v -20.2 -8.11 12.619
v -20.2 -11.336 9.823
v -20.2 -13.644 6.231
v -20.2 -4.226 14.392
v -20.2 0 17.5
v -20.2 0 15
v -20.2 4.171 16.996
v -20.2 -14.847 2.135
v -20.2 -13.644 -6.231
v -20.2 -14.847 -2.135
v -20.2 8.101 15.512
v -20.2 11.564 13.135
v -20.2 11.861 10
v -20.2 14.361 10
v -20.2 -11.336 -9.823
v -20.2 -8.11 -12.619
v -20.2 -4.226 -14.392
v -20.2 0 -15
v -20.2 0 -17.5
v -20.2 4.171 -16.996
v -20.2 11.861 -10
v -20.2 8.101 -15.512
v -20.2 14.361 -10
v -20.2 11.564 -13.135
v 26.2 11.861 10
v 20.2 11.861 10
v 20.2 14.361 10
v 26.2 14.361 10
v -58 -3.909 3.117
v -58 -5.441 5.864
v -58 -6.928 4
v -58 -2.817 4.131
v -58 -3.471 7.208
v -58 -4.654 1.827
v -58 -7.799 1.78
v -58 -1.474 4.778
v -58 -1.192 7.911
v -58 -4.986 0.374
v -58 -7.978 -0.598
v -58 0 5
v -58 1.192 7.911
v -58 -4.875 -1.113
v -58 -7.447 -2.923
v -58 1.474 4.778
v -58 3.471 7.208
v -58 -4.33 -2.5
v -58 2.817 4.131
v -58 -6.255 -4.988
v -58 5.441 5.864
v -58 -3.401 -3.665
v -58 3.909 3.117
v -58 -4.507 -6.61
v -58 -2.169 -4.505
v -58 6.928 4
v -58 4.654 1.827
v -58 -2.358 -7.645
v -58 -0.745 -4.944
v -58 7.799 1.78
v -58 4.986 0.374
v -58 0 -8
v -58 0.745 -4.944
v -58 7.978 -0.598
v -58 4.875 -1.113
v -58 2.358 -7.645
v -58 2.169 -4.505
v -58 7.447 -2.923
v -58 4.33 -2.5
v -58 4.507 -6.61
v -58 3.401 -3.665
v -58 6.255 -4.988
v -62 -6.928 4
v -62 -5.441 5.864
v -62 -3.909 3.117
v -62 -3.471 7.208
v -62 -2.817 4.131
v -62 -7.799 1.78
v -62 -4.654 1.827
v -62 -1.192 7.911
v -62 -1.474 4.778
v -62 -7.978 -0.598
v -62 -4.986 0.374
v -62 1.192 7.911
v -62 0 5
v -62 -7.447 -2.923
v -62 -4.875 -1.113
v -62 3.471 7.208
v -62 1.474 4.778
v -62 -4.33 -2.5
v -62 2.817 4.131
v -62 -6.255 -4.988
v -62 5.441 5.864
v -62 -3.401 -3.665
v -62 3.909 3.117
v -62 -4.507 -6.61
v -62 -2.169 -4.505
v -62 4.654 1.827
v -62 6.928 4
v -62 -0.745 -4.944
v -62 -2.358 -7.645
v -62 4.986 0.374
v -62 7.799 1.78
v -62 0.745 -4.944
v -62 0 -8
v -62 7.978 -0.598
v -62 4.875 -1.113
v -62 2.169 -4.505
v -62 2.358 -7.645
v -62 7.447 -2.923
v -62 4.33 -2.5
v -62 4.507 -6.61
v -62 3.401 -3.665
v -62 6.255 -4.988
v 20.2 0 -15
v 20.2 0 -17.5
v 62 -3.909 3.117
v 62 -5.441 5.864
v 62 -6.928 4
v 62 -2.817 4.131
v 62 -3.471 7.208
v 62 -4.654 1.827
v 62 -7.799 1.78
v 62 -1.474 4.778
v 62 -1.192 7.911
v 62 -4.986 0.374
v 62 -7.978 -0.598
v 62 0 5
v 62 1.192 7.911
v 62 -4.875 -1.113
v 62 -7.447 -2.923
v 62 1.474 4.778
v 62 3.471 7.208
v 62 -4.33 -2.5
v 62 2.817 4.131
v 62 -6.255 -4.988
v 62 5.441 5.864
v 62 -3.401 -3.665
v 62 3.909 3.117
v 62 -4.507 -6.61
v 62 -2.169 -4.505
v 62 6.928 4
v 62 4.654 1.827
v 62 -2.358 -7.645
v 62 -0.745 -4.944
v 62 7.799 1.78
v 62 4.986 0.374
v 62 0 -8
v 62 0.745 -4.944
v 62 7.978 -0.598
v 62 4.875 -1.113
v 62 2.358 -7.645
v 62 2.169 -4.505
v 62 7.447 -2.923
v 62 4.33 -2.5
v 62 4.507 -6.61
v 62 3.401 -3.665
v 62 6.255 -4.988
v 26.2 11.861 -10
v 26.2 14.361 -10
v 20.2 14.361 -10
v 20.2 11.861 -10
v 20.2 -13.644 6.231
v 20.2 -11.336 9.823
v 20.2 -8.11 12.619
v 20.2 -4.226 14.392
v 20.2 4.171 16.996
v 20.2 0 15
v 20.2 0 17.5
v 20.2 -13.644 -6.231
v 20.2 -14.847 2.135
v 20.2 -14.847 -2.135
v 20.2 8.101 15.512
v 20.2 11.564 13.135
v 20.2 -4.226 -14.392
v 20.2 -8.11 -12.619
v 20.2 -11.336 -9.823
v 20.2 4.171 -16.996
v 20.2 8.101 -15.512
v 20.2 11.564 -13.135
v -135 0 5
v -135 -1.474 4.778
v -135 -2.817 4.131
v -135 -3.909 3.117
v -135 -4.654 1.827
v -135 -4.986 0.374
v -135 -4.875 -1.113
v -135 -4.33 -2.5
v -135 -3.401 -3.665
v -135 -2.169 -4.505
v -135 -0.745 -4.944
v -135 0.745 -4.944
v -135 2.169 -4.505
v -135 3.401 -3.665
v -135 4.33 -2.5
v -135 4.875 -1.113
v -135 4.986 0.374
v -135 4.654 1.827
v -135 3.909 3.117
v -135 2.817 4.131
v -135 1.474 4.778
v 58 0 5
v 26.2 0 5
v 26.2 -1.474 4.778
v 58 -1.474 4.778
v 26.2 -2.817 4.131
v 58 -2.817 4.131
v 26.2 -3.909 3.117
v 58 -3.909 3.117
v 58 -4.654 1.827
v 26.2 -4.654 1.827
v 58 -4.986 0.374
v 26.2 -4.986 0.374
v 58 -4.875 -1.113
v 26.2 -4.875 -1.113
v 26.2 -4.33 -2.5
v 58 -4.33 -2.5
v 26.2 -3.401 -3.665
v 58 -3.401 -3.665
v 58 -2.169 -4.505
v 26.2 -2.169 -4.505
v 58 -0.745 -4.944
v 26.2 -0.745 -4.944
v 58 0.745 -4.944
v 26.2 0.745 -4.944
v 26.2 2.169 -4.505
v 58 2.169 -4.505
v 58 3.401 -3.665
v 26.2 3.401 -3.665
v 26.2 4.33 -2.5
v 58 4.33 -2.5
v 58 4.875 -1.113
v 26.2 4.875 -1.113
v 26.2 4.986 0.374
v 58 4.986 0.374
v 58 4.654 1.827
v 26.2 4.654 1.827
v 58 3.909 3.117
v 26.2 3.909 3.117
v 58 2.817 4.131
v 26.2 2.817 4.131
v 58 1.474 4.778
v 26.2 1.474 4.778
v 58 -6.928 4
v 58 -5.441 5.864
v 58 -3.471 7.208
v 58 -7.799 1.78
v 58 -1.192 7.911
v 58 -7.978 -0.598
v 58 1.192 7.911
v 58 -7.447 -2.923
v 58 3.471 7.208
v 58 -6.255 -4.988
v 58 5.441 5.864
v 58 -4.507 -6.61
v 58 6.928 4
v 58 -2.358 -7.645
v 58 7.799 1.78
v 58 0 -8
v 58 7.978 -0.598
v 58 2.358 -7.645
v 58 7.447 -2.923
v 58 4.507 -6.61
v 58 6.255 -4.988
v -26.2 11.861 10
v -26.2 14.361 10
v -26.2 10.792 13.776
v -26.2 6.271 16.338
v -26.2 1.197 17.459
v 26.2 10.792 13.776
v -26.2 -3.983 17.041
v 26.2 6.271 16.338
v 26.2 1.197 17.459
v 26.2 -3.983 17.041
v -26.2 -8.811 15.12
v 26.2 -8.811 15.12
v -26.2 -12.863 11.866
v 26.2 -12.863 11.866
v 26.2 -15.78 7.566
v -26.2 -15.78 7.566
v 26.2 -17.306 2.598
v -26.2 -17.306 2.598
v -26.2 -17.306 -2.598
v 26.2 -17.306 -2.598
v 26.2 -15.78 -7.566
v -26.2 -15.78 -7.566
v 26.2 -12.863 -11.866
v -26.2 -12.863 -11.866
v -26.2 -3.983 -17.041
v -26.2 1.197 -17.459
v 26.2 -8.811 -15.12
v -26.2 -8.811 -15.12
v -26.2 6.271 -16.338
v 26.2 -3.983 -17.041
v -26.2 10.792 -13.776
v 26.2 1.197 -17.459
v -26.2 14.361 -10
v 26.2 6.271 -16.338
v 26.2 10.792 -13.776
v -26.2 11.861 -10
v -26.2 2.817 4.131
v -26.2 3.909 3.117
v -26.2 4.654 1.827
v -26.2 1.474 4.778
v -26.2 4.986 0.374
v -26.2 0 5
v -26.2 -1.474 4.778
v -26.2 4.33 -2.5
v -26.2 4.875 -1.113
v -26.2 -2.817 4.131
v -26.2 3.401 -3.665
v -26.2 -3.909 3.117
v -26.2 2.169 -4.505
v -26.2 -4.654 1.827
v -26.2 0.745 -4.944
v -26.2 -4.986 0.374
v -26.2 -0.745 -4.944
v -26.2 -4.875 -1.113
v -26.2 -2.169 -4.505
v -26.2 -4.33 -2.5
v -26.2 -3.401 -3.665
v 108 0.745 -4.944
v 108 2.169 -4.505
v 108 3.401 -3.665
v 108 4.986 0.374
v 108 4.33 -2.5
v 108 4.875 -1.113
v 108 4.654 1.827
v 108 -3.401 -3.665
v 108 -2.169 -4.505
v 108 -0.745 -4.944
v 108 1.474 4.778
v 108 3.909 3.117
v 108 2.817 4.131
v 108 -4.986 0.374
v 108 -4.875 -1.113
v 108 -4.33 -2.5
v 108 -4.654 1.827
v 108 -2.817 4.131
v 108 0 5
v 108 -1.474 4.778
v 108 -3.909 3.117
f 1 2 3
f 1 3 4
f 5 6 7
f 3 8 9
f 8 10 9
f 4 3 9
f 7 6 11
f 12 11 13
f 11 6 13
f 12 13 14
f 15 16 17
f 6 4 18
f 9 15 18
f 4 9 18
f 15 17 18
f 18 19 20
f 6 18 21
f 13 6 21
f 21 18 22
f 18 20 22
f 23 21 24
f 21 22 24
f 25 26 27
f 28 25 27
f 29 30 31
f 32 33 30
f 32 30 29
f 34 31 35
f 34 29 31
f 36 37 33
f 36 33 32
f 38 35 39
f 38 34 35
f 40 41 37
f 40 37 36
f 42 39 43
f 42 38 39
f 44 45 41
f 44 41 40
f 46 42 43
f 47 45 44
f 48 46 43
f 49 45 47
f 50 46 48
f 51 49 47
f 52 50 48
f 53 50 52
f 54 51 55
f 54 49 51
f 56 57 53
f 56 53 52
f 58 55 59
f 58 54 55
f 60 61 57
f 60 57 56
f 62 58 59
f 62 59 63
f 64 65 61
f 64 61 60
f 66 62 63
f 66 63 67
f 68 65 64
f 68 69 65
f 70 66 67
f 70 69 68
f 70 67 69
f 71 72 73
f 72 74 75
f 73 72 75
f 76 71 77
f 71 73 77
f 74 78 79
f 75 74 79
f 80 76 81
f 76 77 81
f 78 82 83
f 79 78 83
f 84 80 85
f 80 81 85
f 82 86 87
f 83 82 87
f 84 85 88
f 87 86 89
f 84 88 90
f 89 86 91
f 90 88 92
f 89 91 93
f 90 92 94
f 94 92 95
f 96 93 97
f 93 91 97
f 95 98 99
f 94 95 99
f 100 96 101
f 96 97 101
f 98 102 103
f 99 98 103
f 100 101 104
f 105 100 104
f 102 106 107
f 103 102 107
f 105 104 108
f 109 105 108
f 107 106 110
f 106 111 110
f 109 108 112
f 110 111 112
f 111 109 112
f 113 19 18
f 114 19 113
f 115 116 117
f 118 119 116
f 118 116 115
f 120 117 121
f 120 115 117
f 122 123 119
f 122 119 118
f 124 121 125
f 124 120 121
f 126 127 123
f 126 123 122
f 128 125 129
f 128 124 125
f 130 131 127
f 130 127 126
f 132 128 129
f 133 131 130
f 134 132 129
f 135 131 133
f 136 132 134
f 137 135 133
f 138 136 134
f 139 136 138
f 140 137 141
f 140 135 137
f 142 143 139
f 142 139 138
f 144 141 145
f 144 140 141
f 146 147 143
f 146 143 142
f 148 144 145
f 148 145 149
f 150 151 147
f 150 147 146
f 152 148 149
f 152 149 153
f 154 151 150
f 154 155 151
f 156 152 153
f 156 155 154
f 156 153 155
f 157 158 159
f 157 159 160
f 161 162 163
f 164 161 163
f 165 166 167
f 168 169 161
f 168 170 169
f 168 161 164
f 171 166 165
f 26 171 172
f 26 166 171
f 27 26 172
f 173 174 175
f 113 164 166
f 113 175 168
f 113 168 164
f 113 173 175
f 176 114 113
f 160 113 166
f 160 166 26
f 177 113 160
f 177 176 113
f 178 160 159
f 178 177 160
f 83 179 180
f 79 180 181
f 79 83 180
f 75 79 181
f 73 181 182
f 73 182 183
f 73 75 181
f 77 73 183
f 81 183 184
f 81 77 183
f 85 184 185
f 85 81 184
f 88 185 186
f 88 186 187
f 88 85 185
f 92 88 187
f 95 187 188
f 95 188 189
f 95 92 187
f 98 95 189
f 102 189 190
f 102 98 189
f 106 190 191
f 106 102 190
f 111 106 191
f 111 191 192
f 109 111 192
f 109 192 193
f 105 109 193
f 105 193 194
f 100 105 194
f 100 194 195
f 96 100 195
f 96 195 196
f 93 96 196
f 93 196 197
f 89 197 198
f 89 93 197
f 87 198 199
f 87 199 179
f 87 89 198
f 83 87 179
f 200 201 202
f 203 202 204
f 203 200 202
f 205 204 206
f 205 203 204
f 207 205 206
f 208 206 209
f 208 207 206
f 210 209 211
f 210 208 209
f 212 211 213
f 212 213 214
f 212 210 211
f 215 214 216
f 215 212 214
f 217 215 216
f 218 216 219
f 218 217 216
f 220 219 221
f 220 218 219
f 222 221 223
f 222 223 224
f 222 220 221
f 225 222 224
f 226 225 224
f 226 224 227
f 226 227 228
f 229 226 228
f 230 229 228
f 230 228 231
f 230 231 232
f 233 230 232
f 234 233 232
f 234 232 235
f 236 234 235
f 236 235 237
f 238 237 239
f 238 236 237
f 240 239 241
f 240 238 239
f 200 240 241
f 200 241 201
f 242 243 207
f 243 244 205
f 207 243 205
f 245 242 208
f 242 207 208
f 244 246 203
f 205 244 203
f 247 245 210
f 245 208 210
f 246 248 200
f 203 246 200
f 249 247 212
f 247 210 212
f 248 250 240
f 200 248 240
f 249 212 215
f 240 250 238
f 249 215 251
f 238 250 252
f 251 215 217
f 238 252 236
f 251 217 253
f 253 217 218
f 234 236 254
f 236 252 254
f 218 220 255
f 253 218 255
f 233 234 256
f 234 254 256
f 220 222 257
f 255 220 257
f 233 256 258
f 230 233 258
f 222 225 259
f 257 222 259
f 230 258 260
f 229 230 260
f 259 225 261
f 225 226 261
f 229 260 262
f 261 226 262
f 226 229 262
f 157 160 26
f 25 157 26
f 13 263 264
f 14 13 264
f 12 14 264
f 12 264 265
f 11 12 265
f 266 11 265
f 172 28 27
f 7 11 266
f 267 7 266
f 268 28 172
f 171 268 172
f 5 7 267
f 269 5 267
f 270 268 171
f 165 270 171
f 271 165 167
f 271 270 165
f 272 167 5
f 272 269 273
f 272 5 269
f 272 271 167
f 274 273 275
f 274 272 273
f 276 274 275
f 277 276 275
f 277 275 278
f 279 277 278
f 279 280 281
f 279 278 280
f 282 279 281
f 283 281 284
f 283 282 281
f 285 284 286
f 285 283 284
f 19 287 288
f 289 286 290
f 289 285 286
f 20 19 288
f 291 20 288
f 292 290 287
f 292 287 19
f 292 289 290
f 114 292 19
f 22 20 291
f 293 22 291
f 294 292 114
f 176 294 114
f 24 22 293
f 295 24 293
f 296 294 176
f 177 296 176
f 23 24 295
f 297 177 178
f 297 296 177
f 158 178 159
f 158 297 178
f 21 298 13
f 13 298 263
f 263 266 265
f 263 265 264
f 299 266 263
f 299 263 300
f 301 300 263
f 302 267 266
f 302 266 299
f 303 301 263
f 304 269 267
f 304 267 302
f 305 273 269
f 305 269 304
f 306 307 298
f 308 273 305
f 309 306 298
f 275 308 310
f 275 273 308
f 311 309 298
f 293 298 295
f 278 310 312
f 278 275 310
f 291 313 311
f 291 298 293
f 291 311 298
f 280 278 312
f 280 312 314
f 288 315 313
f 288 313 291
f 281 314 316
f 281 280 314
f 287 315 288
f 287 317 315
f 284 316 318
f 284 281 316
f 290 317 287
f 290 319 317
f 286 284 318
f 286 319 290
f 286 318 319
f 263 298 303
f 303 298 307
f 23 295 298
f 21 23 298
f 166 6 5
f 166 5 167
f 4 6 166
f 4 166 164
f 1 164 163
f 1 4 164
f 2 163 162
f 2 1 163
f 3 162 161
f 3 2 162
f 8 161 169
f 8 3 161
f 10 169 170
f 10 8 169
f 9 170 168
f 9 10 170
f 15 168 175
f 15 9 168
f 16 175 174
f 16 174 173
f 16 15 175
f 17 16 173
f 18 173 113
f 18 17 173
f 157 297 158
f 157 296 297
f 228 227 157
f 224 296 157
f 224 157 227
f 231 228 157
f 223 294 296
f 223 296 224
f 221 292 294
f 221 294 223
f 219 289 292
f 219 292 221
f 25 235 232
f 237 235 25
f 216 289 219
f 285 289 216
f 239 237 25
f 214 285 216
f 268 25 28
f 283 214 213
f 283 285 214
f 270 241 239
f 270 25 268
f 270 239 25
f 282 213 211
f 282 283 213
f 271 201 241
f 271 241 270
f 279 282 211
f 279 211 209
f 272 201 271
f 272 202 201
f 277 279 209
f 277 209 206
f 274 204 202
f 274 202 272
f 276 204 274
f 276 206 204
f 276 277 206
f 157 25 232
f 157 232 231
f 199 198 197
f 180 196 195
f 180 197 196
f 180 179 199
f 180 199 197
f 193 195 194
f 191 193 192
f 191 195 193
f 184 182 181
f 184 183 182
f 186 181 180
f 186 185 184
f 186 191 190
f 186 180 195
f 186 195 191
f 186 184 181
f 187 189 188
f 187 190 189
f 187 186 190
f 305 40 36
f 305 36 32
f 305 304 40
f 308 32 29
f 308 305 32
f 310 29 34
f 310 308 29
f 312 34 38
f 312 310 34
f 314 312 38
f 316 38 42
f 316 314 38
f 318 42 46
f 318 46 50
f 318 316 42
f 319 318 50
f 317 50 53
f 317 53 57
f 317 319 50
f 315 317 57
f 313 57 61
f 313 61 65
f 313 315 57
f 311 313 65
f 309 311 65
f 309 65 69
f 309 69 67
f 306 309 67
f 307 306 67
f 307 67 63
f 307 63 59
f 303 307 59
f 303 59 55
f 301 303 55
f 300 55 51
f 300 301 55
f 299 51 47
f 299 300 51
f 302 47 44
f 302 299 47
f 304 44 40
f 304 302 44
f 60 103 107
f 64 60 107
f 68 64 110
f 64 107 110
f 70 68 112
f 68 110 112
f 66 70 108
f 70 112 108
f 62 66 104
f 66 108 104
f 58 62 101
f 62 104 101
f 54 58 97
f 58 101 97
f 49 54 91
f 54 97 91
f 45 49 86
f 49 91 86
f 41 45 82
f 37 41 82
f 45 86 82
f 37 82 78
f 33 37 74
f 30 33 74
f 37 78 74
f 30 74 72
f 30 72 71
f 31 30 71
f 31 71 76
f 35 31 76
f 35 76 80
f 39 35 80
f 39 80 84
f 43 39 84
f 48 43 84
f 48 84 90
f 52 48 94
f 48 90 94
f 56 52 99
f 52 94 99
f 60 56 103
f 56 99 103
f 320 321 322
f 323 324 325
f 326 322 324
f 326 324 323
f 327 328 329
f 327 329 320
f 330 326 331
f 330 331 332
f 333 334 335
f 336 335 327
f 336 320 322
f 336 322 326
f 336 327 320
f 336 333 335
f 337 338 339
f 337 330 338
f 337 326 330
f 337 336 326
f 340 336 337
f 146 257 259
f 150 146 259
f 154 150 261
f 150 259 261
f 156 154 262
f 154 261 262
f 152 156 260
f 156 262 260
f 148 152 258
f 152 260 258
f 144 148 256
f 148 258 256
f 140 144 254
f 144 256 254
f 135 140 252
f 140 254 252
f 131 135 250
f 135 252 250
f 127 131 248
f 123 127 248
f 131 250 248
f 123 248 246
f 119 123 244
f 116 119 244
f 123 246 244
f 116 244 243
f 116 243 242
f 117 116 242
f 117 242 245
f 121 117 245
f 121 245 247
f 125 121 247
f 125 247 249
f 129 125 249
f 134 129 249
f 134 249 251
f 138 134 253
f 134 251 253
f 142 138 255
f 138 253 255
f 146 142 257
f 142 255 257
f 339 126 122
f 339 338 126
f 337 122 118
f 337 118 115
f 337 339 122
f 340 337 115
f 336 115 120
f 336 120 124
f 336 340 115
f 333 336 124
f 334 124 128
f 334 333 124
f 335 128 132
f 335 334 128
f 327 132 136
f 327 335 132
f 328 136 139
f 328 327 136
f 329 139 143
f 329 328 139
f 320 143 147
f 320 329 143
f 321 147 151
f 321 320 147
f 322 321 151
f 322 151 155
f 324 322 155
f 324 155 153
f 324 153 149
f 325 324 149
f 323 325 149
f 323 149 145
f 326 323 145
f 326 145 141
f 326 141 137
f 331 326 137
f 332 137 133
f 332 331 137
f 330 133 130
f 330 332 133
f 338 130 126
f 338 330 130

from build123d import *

# Parameters (mm, degrees)
CUT_EXTRUDE1_DEPTH       = 138.249772313
CUT_EXTRUDE1_DEPTH_BACK  = 138.249772313
SKETCH3_W                = 40.4
SKETCH3_H                = 18
CUT_EXTRUDE2_REACH       = 138.463
BOSS_EXTRUDE1_DEPTH      = 2
BOSS_EXTRUDE1_DEPTH_BACK = 2
SKETCH5_R                = 8
BOSS_EXTRUDE2_DEPTH      = 2
BOSS_EXTRUDE2_DEPTH_BACK = 2
SKETCH6_R                = 8


with BuildPart() as part:
    # Sketch1 → Revolve2 (revolve)
    with BuildSketch(Plane.XY, mode=Mode.PRIVATE) as revolve2_sk:
        Polygon((-135, 5), (-26.2, 5), (-26.2, 17.5), (26.2, 17.5), (26.2, 5), (108, 5), (108, 0), (20.2, 0), (20.2, 15), (-20.2, 15), (-20.2, 0), (-135, 0), align=None)
    revolve(revolve2_sk.sketch.rotate(Axis((-109.707215801, 0, 0), (1, 0, 0)), 90), axis=Axis((-109.707215801, 0, 0), (1, 0, 0)))

    # Sketch3 → Cut-Extrude1 (cut, two sides: drawn at the far end of the back side and taken through both)
    with BuildSketch(Plane.XY.offset(-CUT_EXTRUDE1_DEPTH_BACK)):
        with Locations((0, 9)):
            Rectangle(SKETCH3_W, SKETCH3_H)
    extrude(amount=CUT_EXTRUDE1_DEPTH + CUT_EXTRUDE1_DEPTH_BACK, mode=Mode.SUBTRACT)

    # Cut-Extrude2: up to this face of the body (flat: up to its plane)
    cut_extrude2_end = Plane(part.part.faces().sort_by_distance((26.2, 0, -17.005025253))[0])
    # Sketch4 → Cut-Extrude2 (cut, up to the picked face)
    with BuildSketch(Plane.ZY.offset(26.2), mode=Mode.PRIVATE) as cut_extrude2_sk1:
        with BuildLine():
            Line((-10, 14.361406616), (-10, 11.861406616))
            Line((-10, 11.861406616), (10, 11.861406616))
            Line((10, 11.861406616), (10, 14.361406616))
            ThreePointArc((10, 14.361406616), (0, 17.5), (-10, 14.361406616))
        make_face()
    cut_extrude2_tool1 = split(extrude(cut_extrude2_sk1.sketch, amount=-CUT_EXTRUDE2_REACH, mode=Mode.PRIVATE), bisect_by=cut_extrude2_end, keep=Keep.BOTH, mode=Mode.PRIVATE)
    add(cut_extrude2_tool1.solids().sort_by(Axis((-26.2, 14.269595, 0), (1, 0, 0)))[0], mode=Mode.SUBTRACT)

    # Sketch5 → Boss-Extrude1 (add, two sides: drawn at the far end of the back side and taken through both)
    with BuildSketch(Plane(origin=(60, 0, 0), x_dir=(0, 0, -1), z_dir=(1, 0, 0)).offset(-BOSS_EXTRUDE1_DEPTH_BACK)):
        Circle(SKETCH5_R)
    extrude(amount=BOSS_EXTRUDE1_DEPTH + BOSS_EXTRUDE1_DEPTH_BACK)

    # Sketch6 → Boss-Extrude2 (add, two sides: drawn at the far end of the back side and taken through both)
    with BuildSketch(Plane(origin=(-60, 0, 0), x_dir=(0, 0, -1), z_dir=(1, 0, 0)).offset(-BOSS_EXTRUDE2_DEPTH_BACK)):
        Circle(SKETCH6_R)
    extrude(amount=BOSS_EXTRUDE2_DEPTH + BOSS_EXTRUDE2_DEPTH_BACK)


solid = part.part
